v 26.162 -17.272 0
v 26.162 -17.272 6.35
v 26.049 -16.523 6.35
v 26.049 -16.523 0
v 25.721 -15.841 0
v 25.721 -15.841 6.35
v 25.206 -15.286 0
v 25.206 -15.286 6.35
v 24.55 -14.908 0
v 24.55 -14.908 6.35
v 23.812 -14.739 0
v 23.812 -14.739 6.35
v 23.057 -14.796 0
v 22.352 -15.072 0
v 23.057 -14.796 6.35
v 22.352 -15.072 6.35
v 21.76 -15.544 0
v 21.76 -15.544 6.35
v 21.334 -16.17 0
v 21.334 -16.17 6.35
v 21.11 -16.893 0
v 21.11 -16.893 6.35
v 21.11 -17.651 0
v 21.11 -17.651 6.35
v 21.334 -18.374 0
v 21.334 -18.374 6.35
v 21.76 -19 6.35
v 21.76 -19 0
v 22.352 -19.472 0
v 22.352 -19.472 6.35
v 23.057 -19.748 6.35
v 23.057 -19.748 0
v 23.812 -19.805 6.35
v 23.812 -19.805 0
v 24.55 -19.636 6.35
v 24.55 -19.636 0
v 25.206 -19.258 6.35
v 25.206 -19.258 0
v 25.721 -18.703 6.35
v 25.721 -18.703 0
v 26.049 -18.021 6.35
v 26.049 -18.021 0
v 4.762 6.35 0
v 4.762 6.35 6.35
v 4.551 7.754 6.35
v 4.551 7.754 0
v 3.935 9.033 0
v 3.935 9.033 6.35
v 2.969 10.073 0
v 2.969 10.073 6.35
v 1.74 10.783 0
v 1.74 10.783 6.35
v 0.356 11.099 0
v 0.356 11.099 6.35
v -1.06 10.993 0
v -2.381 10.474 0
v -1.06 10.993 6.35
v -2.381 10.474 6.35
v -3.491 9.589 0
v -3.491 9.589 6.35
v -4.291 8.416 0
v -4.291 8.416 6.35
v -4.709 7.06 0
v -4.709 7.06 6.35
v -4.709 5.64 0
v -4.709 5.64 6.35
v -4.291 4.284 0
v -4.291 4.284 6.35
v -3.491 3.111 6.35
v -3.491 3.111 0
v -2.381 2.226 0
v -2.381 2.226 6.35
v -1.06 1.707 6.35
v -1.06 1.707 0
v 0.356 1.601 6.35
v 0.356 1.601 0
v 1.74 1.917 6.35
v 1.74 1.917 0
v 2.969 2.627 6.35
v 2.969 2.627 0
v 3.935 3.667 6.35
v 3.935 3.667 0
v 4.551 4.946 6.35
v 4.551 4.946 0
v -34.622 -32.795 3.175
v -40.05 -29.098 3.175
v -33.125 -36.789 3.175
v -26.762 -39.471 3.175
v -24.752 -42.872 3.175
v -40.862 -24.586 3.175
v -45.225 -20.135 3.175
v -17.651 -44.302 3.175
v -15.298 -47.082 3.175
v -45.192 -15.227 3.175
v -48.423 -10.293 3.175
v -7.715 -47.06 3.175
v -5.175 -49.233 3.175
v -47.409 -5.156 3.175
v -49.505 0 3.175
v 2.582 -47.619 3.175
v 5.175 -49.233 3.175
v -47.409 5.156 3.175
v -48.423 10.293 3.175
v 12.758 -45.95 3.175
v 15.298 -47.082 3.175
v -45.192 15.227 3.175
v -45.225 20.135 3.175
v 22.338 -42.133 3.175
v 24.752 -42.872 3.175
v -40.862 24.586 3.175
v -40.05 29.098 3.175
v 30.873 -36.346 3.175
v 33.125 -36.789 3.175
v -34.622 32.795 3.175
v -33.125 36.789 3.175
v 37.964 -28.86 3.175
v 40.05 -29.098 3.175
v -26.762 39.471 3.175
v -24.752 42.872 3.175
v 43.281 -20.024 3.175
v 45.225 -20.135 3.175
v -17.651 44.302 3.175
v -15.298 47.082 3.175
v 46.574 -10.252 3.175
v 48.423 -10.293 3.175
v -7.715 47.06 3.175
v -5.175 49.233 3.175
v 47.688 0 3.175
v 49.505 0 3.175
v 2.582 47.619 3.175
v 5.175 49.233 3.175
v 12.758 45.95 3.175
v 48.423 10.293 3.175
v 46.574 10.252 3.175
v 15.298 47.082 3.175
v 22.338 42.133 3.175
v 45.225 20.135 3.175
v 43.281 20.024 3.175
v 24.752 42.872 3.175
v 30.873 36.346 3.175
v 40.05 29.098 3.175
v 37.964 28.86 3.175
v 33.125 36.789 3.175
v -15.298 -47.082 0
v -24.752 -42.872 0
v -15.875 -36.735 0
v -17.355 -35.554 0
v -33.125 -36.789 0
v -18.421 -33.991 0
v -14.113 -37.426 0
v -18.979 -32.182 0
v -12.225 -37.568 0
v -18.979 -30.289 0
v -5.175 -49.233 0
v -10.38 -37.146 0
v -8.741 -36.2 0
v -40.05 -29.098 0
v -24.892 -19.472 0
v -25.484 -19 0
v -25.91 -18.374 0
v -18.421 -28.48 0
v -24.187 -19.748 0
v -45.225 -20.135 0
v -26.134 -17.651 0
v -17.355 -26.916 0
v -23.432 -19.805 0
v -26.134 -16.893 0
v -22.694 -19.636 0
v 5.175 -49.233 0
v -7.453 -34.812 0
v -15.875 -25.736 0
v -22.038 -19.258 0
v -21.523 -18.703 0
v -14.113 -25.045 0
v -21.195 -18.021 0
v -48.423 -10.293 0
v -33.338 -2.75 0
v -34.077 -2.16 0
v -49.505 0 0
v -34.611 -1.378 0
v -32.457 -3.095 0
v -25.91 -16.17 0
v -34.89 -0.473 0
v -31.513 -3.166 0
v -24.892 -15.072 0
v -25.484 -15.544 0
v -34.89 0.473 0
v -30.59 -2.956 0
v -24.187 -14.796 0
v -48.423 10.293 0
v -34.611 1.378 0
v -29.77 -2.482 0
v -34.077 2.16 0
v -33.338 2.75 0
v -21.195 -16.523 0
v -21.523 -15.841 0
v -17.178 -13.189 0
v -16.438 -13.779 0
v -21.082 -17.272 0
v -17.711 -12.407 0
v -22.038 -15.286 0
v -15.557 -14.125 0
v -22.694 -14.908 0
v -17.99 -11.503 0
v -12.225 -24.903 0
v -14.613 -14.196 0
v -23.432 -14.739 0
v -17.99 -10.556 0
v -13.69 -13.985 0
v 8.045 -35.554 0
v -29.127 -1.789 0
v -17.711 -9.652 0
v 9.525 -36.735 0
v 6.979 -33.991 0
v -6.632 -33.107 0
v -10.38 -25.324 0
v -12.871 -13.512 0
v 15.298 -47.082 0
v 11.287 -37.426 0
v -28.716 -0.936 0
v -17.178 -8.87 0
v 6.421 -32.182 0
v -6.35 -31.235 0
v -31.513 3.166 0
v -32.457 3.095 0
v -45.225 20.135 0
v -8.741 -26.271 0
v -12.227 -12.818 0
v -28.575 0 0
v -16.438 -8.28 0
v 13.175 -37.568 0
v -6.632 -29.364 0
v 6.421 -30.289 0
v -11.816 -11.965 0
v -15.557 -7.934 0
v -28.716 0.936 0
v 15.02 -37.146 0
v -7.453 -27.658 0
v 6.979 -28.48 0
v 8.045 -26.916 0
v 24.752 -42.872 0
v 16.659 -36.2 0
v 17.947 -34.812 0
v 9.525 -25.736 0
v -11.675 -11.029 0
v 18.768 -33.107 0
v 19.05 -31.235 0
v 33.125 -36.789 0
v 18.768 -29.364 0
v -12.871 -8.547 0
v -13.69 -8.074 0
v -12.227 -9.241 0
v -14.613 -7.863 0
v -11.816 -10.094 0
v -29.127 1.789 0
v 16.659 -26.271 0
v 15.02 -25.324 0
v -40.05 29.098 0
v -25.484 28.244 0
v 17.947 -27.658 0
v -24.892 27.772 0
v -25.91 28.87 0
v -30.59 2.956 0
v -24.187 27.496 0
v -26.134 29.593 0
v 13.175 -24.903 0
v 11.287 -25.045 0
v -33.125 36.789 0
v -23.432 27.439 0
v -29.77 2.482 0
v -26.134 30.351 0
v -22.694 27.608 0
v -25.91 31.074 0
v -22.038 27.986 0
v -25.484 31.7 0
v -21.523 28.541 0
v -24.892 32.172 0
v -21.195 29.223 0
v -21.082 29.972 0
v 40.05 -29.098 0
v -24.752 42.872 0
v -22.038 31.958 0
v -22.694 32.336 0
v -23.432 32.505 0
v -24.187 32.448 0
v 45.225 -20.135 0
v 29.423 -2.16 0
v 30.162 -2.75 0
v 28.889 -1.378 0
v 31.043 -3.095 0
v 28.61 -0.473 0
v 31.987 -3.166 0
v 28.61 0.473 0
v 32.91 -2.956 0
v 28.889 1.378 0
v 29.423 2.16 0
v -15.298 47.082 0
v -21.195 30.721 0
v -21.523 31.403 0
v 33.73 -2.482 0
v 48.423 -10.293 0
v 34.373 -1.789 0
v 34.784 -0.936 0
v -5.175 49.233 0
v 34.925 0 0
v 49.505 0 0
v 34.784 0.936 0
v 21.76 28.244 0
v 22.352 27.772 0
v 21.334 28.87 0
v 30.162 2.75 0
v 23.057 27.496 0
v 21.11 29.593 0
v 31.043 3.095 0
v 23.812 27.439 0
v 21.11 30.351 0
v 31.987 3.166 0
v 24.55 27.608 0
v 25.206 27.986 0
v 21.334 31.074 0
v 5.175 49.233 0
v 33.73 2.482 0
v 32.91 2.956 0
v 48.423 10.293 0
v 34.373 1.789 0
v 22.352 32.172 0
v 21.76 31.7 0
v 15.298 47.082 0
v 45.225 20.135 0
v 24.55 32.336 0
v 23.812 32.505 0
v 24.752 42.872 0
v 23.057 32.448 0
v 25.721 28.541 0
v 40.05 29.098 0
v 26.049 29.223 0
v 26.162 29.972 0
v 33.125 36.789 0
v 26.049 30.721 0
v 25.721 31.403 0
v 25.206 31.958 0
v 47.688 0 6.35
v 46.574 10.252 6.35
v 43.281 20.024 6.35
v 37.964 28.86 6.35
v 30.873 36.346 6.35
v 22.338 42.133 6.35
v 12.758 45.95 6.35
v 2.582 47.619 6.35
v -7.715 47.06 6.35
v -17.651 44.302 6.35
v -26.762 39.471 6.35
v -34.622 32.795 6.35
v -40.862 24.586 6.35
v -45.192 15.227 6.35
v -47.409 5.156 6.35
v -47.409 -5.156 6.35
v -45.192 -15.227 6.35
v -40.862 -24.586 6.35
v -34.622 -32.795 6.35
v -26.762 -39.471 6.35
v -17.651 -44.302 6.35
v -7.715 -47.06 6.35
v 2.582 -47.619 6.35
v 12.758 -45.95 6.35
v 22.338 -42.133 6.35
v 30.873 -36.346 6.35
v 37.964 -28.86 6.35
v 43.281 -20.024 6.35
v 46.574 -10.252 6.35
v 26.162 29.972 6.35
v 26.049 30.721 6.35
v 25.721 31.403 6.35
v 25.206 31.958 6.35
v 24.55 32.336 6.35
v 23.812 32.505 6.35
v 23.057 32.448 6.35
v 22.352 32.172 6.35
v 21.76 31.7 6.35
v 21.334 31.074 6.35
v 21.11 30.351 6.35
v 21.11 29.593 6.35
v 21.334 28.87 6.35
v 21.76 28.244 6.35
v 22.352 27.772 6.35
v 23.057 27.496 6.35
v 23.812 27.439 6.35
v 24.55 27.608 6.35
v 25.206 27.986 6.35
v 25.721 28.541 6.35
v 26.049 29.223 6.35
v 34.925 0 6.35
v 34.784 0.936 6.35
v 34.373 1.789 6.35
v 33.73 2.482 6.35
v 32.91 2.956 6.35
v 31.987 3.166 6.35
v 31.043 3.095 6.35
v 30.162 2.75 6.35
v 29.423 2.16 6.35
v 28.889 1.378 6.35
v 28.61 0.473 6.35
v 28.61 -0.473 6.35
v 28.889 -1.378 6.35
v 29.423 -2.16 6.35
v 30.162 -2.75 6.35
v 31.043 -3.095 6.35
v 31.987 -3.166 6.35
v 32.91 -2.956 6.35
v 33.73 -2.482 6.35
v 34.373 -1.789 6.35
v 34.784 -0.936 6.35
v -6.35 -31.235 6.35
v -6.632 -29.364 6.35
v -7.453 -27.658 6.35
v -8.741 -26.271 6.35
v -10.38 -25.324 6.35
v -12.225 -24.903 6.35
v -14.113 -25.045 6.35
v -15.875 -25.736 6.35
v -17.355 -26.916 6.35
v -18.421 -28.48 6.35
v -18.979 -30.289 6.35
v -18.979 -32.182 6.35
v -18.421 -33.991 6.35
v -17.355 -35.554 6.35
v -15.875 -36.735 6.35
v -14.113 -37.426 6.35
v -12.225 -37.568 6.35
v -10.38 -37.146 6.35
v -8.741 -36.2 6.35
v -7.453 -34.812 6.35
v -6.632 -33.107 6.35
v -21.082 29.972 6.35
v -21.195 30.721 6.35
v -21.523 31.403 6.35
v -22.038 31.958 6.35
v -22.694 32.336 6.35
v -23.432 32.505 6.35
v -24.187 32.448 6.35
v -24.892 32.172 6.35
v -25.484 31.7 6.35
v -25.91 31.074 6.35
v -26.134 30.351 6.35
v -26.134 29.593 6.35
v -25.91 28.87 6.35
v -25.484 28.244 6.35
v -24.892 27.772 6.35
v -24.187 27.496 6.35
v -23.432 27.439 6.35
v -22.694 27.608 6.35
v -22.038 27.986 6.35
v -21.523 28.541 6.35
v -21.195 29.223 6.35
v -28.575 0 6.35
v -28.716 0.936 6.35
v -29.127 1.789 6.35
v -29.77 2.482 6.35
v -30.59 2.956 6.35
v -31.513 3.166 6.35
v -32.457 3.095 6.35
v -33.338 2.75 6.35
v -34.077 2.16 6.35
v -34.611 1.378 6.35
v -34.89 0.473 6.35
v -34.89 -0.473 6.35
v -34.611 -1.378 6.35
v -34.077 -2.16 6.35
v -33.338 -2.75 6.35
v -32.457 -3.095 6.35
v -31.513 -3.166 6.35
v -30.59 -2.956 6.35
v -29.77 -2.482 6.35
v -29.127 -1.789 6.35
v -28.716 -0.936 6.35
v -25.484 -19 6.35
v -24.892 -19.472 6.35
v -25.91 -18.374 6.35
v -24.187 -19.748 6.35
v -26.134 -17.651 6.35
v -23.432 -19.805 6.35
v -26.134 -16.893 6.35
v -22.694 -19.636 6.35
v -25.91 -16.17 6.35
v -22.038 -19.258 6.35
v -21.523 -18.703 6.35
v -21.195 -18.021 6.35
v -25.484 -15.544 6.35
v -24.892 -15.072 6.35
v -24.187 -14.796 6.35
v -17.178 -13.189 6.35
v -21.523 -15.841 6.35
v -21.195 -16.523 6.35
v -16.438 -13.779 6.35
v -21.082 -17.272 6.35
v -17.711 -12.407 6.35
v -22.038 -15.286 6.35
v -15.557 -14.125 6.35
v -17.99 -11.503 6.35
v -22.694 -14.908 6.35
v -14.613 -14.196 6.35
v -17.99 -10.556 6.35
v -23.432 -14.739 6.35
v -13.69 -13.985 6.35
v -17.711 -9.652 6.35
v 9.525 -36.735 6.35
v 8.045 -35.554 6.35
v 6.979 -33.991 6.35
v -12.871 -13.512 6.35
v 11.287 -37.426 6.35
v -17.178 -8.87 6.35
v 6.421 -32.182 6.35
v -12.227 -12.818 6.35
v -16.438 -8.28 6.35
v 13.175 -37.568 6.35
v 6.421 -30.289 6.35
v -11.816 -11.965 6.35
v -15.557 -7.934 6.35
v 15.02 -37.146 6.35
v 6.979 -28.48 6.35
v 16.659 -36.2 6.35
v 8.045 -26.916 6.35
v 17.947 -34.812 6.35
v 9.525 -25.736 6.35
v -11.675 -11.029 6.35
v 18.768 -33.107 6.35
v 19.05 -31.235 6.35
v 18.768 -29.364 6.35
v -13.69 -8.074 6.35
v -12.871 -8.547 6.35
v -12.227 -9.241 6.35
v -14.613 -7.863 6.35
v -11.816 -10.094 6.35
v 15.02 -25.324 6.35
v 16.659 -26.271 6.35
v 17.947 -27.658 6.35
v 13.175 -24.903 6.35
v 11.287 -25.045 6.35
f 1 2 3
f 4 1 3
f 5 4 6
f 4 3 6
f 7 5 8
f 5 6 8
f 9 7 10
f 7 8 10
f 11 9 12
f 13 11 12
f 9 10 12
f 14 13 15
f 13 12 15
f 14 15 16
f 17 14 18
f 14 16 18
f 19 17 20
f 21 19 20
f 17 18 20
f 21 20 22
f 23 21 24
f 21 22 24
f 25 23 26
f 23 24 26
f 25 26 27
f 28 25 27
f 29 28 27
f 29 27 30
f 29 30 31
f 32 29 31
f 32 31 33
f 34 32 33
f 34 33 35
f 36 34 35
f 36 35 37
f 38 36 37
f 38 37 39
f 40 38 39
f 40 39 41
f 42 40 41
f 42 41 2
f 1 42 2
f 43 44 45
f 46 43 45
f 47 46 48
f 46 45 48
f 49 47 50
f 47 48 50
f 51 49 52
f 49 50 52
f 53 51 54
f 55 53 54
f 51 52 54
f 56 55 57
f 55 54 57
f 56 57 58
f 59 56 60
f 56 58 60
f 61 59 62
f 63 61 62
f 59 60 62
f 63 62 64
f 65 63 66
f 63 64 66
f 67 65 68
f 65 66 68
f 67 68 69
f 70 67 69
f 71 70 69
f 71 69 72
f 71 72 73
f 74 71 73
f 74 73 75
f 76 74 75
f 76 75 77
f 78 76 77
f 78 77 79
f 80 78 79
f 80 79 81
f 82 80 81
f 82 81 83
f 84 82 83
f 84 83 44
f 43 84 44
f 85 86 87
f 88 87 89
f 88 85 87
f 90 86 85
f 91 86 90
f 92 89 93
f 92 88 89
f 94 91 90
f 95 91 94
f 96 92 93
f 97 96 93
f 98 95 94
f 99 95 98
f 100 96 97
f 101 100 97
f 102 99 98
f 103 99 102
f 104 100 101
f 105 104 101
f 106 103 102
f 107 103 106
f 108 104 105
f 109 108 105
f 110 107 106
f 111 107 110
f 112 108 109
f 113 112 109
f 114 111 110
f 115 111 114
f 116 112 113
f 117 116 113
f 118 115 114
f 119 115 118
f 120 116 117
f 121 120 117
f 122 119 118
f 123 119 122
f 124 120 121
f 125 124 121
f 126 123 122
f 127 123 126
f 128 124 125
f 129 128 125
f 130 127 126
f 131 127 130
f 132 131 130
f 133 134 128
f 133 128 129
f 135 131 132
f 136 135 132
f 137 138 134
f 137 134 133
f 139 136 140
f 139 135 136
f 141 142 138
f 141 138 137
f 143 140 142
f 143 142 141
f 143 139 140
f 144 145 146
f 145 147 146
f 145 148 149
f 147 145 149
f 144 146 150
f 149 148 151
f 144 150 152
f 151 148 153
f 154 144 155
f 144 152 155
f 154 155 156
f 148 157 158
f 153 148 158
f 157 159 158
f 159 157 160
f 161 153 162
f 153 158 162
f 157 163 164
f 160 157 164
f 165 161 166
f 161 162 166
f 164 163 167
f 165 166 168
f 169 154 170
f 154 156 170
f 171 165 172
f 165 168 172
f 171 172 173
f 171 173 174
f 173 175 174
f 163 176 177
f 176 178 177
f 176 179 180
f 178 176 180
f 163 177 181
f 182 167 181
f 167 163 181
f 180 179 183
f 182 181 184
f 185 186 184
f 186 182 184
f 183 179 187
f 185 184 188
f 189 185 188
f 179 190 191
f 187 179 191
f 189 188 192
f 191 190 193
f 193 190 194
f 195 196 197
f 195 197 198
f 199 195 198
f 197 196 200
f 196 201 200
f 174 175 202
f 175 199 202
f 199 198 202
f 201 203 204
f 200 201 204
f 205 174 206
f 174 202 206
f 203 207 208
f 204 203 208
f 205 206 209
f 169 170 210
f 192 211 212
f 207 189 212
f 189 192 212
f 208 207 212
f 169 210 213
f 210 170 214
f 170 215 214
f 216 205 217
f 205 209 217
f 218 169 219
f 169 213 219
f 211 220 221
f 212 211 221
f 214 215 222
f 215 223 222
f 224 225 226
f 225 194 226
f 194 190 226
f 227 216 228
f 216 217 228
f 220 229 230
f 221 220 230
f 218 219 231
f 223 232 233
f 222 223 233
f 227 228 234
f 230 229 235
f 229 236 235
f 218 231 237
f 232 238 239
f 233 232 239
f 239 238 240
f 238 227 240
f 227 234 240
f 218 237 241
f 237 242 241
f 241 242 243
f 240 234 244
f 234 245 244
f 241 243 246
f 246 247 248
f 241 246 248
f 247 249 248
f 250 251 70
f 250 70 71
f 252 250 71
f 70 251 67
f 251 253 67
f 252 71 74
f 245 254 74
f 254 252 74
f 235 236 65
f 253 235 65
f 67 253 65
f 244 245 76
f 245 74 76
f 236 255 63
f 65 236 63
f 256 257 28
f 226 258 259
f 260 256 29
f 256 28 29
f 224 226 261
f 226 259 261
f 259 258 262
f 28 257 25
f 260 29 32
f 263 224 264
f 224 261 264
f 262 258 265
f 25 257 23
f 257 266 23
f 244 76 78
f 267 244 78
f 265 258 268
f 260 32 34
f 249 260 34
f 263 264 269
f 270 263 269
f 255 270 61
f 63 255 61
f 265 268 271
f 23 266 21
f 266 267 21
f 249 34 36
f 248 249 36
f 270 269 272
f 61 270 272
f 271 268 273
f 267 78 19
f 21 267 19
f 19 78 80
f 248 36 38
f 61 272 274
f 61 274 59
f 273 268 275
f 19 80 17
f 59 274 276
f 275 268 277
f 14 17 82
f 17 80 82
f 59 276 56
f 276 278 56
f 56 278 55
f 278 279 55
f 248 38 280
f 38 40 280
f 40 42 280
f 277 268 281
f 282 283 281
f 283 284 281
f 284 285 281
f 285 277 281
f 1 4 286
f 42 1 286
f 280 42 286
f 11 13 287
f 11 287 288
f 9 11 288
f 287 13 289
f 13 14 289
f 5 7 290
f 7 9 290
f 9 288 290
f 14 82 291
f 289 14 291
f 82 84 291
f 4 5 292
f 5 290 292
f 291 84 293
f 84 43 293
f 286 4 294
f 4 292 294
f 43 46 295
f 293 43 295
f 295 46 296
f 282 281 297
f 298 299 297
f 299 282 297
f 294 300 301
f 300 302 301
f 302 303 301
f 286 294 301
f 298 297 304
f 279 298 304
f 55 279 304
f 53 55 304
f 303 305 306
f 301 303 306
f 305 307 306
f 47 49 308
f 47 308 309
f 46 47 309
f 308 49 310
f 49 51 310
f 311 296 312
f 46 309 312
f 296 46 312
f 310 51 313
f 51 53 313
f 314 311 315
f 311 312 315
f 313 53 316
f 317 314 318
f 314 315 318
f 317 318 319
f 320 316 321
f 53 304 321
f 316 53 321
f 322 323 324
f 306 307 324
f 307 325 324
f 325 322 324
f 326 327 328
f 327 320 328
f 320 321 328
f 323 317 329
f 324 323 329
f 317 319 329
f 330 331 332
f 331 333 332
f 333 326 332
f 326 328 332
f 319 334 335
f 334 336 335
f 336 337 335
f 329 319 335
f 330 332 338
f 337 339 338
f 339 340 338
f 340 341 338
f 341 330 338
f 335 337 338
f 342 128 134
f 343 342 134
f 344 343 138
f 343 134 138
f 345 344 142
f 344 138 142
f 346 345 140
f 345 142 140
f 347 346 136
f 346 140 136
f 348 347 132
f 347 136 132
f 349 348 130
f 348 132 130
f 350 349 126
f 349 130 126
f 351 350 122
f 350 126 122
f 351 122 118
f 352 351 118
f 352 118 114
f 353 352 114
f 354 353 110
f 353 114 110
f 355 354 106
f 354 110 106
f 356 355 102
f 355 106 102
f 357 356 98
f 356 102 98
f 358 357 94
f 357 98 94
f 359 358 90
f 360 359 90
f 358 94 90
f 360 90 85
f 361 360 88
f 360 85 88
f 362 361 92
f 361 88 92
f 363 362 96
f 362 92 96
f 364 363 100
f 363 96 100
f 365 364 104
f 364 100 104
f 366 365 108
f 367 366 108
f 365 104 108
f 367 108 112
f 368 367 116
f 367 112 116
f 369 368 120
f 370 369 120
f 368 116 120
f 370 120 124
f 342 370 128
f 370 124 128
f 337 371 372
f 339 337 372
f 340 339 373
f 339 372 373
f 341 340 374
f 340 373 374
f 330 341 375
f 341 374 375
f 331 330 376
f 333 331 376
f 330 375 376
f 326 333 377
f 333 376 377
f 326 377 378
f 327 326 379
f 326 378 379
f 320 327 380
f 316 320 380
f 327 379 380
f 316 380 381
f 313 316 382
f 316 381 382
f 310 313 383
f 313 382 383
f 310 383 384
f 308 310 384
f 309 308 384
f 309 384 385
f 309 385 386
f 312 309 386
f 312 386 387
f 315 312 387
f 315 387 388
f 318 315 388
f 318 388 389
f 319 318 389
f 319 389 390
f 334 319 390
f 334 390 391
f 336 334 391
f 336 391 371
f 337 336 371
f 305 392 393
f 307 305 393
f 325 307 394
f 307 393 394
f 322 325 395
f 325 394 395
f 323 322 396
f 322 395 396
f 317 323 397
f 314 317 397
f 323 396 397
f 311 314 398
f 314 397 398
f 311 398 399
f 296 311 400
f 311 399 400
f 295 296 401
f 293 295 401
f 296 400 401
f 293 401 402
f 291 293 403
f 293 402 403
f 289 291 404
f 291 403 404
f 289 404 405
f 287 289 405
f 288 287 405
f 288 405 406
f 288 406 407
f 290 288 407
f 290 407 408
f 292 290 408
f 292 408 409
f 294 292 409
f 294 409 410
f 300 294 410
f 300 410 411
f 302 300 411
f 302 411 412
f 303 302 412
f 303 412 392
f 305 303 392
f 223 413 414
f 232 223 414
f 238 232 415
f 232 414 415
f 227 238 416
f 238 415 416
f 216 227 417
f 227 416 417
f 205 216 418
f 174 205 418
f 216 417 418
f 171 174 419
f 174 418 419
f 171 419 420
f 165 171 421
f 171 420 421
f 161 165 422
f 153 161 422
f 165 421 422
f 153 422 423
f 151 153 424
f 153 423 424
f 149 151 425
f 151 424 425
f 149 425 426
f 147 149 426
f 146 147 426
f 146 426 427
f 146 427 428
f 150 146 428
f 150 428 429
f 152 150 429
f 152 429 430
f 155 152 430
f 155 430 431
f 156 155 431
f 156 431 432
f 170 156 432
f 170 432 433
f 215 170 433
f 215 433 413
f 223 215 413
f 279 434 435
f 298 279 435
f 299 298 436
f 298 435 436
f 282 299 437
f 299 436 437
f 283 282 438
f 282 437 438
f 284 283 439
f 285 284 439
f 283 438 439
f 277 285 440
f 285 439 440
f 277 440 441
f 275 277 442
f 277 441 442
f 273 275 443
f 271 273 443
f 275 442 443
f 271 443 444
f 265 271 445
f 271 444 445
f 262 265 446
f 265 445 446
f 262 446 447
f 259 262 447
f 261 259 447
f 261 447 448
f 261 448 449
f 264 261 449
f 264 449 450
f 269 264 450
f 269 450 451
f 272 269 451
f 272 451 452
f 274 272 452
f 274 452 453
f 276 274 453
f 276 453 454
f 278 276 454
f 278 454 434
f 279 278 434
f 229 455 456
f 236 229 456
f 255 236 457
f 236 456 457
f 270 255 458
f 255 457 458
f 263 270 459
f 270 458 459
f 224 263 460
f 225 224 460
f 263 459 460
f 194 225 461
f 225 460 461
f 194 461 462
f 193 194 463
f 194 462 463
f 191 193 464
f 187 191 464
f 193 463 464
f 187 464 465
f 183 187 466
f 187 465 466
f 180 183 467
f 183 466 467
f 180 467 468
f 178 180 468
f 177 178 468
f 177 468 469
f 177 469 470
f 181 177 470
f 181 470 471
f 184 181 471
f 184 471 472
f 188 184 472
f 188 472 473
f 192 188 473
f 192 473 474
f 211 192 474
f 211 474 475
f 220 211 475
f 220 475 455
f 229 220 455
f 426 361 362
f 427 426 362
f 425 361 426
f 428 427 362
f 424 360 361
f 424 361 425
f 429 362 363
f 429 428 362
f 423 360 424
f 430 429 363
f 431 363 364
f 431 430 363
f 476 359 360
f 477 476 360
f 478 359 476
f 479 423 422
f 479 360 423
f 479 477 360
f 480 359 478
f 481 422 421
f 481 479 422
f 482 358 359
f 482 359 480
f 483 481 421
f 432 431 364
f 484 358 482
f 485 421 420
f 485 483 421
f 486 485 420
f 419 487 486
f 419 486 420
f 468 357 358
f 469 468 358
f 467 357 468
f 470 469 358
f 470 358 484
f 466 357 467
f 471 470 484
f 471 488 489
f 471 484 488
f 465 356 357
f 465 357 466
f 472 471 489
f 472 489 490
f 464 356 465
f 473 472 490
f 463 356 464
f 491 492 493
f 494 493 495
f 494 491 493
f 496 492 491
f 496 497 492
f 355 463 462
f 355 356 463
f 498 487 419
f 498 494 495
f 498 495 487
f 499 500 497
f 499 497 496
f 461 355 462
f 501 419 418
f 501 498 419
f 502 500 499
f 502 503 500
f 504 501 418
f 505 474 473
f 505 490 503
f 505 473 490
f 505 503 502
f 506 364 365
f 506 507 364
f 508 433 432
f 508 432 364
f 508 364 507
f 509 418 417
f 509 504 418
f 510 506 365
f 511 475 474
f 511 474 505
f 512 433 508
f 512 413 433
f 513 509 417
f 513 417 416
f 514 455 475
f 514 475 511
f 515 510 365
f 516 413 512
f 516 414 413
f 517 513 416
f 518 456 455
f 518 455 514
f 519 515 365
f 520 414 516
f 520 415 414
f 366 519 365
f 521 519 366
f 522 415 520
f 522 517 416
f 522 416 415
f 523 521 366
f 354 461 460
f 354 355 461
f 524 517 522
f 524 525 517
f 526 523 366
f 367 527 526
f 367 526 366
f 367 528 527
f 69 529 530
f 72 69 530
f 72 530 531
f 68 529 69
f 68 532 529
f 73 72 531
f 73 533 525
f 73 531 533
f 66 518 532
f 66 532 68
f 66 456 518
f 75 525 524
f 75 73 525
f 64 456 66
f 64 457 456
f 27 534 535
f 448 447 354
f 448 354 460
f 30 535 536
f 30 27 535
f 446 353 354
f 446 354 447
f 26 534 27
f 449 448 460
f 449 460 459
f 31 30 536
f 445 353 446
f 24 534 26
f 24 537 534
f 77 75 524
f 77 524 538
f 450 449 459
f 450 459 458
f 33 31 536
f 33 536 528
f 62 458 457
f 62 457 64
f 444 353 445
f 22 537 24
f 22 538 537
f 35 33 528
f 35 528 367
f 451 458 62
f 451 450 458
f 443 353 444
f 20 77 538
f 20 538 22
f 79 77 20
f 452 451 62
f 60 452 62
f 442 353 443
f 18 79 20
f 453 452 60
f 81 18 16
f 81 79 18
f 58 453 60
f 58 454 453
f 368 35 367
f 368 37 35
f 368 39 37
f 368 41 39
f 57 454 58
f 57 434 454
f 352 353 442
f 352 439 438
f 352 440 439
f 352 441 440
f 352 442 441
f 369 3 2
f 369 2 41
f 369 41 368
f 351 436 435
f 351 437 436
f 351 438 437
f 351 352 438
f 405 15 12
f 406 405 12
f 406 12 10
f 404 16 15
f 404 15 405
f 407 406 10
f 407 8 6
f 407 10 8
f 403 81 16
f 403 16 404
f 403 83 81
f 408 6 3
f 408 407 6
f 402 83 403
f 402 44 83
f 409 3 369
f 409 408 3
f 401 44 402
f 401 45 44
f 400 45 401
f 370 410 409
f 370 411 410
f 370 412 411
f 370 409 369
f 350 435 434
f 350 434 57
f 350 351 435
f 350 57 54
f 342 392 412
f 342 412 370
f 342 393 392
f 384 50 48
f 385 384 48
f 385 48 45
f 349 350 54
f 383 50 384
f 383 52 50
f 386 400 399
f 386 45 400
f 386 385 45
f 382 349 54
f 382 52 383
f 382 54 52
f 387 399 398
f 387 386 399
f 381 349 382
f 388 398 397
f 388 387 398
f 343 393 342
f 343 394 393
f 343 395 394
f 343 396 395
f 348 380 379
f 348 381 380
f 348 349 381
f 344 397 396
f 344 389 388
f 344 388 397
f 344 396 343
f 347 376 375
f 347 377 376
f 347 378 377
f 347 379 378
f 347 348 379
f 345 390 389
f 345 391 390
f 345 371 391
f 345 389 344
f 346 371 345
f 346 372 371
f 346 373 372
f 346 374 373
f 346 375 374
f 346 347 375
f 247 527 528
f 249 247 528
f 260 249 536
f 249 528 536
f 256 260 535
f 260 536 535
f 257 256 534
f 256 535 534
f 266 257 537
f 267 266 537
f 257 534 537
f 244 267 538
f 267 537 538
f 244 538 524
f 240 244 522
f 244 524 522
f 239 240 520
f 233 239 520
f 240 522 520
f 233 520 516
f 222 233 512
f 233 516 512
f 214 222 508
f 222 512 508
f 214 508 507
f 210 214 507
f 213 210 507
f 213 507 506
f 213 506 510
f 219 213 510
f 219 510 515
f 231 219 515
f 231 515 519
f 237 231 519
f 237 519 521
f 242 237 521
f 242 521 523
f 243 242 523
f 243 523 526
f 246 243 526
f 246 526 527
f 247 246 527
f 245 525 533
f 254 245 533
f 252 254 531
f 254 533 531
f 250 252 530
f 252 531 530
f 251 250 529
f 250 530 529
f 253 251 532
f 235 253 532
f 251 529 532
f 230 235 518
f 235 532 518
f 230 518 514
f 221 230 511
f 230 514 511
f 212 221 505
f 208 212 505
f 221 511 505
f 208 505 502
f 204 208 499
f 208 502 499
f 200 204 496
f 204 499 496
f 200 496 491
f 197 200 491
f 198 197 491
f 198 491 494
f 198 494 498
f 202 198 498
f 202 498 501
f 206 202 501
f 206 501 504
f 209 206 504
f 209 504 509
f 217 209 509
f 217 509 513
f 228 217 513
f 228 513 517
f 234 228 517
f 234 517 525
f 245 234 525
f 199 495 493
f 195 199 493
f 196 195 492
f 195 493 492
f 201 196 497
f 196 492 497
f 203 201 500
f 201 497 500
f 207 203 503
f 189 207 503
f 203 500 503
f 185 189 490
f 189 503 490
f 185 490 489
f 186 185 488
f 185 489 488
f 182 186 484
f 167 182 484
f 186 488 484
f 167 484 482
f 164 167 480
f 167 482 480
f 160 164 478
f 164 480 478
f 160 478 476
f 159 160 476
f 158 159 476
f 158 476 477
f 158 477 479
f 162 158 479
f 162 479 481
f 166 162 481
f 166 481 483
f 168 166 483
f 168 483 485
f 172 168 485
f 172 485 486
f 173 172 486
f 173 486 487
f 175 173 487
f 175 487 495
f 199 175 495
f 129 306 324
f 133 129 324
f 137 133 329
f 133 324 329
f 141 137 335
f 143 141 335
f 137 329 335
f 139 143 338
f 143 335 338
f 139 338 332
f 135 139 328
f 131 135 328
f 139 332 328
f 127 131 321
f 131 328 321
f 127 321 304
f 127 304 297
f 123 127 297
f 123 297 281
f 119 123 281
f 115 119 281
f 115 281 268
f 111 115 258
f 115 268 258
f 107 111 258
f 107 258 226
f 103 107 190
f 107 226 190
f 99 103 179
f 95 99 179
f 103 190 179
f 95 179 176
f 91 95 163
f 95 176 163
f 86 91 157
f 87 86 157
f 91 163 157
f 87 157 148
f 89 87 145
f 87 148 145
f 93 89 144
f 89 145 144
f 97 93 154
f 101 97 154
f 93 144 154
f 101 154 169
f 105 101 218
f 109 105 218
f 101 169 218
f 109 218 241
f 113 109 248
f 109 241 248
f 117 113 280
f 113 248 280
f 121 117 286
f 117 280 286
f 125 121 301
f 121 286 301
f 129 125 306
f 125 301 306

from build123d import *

# Parameters (mm, degrees)
SKETCH1_R           = 49.5046
BOSS_EXTRUDE1_DEPTH = 3.175
SKETCH2_R           = 47.6885
BOSS_EXTRUDE2_DEPTH = 3.175
SKETCH3_R           = 6.35
SKETCH3_R_2         = 3.175
SKETCH3_R_3         = 4.7625
SKETCH3_R_4         = 2.54
CUT_EXTRUDE1_DEPTH  = 71.297463271


with BuildPart() as part:
    # Sketch1 → Boss-Extrude1 (new body)
    with BuildSketch(Plane.XY):
        Circle(SKETCH1_R)
    extrude(amount=BOSS_EXTRUDE1_DEPTH)

    # Sketch2 → Boss-Extrude2 (add)
    with BuildSketch(Plane.XY.offset(3.175)):
        Circle(SKETCH2_R)
    extrude(amount=BOSS_EXTRUDE2_DEPTH)

    # Sketch3 → Cut-Extrude1 (cut, through all)
    with BuildSketch(Plane.XY.offset(6.35)):
        with Locations((-12.7, -31.235352443)):
            Circle(SKETCH3_R)
        with Locations((12.7, -31.235352443)):
            Circle(SKETCH3_R)
        with Locations((-31.75, 0)):
            Circle(SKETCH3_R_2)
        with Locations((31.75, 0)):
            Circle(SKETCH3_R_2)
        with Locations((0, 6.35)):
            Circle(SKETCH3_R_3)
        with Locations((-14.850390051, -11.029456704)):
            Circle(SKETCH3_R_2)
        with Locations((-23.622, 29.972)):
            Circle(SKETCH3_R_4)
        with Locations((23.622, 29.972)):
            Circle(SKETCH3_R_4)
        with Locations((23.622, -17.272)):
            Circle(SKETCH3_R_4)
        with Locations((-23.622, -17.272)):
            Circle(SKETCH3_R_4)
    extrude(amount=-CUT_EXTRUDE1_DEPTH, mode=Mode.SUBTRACT)


solid = part.part
